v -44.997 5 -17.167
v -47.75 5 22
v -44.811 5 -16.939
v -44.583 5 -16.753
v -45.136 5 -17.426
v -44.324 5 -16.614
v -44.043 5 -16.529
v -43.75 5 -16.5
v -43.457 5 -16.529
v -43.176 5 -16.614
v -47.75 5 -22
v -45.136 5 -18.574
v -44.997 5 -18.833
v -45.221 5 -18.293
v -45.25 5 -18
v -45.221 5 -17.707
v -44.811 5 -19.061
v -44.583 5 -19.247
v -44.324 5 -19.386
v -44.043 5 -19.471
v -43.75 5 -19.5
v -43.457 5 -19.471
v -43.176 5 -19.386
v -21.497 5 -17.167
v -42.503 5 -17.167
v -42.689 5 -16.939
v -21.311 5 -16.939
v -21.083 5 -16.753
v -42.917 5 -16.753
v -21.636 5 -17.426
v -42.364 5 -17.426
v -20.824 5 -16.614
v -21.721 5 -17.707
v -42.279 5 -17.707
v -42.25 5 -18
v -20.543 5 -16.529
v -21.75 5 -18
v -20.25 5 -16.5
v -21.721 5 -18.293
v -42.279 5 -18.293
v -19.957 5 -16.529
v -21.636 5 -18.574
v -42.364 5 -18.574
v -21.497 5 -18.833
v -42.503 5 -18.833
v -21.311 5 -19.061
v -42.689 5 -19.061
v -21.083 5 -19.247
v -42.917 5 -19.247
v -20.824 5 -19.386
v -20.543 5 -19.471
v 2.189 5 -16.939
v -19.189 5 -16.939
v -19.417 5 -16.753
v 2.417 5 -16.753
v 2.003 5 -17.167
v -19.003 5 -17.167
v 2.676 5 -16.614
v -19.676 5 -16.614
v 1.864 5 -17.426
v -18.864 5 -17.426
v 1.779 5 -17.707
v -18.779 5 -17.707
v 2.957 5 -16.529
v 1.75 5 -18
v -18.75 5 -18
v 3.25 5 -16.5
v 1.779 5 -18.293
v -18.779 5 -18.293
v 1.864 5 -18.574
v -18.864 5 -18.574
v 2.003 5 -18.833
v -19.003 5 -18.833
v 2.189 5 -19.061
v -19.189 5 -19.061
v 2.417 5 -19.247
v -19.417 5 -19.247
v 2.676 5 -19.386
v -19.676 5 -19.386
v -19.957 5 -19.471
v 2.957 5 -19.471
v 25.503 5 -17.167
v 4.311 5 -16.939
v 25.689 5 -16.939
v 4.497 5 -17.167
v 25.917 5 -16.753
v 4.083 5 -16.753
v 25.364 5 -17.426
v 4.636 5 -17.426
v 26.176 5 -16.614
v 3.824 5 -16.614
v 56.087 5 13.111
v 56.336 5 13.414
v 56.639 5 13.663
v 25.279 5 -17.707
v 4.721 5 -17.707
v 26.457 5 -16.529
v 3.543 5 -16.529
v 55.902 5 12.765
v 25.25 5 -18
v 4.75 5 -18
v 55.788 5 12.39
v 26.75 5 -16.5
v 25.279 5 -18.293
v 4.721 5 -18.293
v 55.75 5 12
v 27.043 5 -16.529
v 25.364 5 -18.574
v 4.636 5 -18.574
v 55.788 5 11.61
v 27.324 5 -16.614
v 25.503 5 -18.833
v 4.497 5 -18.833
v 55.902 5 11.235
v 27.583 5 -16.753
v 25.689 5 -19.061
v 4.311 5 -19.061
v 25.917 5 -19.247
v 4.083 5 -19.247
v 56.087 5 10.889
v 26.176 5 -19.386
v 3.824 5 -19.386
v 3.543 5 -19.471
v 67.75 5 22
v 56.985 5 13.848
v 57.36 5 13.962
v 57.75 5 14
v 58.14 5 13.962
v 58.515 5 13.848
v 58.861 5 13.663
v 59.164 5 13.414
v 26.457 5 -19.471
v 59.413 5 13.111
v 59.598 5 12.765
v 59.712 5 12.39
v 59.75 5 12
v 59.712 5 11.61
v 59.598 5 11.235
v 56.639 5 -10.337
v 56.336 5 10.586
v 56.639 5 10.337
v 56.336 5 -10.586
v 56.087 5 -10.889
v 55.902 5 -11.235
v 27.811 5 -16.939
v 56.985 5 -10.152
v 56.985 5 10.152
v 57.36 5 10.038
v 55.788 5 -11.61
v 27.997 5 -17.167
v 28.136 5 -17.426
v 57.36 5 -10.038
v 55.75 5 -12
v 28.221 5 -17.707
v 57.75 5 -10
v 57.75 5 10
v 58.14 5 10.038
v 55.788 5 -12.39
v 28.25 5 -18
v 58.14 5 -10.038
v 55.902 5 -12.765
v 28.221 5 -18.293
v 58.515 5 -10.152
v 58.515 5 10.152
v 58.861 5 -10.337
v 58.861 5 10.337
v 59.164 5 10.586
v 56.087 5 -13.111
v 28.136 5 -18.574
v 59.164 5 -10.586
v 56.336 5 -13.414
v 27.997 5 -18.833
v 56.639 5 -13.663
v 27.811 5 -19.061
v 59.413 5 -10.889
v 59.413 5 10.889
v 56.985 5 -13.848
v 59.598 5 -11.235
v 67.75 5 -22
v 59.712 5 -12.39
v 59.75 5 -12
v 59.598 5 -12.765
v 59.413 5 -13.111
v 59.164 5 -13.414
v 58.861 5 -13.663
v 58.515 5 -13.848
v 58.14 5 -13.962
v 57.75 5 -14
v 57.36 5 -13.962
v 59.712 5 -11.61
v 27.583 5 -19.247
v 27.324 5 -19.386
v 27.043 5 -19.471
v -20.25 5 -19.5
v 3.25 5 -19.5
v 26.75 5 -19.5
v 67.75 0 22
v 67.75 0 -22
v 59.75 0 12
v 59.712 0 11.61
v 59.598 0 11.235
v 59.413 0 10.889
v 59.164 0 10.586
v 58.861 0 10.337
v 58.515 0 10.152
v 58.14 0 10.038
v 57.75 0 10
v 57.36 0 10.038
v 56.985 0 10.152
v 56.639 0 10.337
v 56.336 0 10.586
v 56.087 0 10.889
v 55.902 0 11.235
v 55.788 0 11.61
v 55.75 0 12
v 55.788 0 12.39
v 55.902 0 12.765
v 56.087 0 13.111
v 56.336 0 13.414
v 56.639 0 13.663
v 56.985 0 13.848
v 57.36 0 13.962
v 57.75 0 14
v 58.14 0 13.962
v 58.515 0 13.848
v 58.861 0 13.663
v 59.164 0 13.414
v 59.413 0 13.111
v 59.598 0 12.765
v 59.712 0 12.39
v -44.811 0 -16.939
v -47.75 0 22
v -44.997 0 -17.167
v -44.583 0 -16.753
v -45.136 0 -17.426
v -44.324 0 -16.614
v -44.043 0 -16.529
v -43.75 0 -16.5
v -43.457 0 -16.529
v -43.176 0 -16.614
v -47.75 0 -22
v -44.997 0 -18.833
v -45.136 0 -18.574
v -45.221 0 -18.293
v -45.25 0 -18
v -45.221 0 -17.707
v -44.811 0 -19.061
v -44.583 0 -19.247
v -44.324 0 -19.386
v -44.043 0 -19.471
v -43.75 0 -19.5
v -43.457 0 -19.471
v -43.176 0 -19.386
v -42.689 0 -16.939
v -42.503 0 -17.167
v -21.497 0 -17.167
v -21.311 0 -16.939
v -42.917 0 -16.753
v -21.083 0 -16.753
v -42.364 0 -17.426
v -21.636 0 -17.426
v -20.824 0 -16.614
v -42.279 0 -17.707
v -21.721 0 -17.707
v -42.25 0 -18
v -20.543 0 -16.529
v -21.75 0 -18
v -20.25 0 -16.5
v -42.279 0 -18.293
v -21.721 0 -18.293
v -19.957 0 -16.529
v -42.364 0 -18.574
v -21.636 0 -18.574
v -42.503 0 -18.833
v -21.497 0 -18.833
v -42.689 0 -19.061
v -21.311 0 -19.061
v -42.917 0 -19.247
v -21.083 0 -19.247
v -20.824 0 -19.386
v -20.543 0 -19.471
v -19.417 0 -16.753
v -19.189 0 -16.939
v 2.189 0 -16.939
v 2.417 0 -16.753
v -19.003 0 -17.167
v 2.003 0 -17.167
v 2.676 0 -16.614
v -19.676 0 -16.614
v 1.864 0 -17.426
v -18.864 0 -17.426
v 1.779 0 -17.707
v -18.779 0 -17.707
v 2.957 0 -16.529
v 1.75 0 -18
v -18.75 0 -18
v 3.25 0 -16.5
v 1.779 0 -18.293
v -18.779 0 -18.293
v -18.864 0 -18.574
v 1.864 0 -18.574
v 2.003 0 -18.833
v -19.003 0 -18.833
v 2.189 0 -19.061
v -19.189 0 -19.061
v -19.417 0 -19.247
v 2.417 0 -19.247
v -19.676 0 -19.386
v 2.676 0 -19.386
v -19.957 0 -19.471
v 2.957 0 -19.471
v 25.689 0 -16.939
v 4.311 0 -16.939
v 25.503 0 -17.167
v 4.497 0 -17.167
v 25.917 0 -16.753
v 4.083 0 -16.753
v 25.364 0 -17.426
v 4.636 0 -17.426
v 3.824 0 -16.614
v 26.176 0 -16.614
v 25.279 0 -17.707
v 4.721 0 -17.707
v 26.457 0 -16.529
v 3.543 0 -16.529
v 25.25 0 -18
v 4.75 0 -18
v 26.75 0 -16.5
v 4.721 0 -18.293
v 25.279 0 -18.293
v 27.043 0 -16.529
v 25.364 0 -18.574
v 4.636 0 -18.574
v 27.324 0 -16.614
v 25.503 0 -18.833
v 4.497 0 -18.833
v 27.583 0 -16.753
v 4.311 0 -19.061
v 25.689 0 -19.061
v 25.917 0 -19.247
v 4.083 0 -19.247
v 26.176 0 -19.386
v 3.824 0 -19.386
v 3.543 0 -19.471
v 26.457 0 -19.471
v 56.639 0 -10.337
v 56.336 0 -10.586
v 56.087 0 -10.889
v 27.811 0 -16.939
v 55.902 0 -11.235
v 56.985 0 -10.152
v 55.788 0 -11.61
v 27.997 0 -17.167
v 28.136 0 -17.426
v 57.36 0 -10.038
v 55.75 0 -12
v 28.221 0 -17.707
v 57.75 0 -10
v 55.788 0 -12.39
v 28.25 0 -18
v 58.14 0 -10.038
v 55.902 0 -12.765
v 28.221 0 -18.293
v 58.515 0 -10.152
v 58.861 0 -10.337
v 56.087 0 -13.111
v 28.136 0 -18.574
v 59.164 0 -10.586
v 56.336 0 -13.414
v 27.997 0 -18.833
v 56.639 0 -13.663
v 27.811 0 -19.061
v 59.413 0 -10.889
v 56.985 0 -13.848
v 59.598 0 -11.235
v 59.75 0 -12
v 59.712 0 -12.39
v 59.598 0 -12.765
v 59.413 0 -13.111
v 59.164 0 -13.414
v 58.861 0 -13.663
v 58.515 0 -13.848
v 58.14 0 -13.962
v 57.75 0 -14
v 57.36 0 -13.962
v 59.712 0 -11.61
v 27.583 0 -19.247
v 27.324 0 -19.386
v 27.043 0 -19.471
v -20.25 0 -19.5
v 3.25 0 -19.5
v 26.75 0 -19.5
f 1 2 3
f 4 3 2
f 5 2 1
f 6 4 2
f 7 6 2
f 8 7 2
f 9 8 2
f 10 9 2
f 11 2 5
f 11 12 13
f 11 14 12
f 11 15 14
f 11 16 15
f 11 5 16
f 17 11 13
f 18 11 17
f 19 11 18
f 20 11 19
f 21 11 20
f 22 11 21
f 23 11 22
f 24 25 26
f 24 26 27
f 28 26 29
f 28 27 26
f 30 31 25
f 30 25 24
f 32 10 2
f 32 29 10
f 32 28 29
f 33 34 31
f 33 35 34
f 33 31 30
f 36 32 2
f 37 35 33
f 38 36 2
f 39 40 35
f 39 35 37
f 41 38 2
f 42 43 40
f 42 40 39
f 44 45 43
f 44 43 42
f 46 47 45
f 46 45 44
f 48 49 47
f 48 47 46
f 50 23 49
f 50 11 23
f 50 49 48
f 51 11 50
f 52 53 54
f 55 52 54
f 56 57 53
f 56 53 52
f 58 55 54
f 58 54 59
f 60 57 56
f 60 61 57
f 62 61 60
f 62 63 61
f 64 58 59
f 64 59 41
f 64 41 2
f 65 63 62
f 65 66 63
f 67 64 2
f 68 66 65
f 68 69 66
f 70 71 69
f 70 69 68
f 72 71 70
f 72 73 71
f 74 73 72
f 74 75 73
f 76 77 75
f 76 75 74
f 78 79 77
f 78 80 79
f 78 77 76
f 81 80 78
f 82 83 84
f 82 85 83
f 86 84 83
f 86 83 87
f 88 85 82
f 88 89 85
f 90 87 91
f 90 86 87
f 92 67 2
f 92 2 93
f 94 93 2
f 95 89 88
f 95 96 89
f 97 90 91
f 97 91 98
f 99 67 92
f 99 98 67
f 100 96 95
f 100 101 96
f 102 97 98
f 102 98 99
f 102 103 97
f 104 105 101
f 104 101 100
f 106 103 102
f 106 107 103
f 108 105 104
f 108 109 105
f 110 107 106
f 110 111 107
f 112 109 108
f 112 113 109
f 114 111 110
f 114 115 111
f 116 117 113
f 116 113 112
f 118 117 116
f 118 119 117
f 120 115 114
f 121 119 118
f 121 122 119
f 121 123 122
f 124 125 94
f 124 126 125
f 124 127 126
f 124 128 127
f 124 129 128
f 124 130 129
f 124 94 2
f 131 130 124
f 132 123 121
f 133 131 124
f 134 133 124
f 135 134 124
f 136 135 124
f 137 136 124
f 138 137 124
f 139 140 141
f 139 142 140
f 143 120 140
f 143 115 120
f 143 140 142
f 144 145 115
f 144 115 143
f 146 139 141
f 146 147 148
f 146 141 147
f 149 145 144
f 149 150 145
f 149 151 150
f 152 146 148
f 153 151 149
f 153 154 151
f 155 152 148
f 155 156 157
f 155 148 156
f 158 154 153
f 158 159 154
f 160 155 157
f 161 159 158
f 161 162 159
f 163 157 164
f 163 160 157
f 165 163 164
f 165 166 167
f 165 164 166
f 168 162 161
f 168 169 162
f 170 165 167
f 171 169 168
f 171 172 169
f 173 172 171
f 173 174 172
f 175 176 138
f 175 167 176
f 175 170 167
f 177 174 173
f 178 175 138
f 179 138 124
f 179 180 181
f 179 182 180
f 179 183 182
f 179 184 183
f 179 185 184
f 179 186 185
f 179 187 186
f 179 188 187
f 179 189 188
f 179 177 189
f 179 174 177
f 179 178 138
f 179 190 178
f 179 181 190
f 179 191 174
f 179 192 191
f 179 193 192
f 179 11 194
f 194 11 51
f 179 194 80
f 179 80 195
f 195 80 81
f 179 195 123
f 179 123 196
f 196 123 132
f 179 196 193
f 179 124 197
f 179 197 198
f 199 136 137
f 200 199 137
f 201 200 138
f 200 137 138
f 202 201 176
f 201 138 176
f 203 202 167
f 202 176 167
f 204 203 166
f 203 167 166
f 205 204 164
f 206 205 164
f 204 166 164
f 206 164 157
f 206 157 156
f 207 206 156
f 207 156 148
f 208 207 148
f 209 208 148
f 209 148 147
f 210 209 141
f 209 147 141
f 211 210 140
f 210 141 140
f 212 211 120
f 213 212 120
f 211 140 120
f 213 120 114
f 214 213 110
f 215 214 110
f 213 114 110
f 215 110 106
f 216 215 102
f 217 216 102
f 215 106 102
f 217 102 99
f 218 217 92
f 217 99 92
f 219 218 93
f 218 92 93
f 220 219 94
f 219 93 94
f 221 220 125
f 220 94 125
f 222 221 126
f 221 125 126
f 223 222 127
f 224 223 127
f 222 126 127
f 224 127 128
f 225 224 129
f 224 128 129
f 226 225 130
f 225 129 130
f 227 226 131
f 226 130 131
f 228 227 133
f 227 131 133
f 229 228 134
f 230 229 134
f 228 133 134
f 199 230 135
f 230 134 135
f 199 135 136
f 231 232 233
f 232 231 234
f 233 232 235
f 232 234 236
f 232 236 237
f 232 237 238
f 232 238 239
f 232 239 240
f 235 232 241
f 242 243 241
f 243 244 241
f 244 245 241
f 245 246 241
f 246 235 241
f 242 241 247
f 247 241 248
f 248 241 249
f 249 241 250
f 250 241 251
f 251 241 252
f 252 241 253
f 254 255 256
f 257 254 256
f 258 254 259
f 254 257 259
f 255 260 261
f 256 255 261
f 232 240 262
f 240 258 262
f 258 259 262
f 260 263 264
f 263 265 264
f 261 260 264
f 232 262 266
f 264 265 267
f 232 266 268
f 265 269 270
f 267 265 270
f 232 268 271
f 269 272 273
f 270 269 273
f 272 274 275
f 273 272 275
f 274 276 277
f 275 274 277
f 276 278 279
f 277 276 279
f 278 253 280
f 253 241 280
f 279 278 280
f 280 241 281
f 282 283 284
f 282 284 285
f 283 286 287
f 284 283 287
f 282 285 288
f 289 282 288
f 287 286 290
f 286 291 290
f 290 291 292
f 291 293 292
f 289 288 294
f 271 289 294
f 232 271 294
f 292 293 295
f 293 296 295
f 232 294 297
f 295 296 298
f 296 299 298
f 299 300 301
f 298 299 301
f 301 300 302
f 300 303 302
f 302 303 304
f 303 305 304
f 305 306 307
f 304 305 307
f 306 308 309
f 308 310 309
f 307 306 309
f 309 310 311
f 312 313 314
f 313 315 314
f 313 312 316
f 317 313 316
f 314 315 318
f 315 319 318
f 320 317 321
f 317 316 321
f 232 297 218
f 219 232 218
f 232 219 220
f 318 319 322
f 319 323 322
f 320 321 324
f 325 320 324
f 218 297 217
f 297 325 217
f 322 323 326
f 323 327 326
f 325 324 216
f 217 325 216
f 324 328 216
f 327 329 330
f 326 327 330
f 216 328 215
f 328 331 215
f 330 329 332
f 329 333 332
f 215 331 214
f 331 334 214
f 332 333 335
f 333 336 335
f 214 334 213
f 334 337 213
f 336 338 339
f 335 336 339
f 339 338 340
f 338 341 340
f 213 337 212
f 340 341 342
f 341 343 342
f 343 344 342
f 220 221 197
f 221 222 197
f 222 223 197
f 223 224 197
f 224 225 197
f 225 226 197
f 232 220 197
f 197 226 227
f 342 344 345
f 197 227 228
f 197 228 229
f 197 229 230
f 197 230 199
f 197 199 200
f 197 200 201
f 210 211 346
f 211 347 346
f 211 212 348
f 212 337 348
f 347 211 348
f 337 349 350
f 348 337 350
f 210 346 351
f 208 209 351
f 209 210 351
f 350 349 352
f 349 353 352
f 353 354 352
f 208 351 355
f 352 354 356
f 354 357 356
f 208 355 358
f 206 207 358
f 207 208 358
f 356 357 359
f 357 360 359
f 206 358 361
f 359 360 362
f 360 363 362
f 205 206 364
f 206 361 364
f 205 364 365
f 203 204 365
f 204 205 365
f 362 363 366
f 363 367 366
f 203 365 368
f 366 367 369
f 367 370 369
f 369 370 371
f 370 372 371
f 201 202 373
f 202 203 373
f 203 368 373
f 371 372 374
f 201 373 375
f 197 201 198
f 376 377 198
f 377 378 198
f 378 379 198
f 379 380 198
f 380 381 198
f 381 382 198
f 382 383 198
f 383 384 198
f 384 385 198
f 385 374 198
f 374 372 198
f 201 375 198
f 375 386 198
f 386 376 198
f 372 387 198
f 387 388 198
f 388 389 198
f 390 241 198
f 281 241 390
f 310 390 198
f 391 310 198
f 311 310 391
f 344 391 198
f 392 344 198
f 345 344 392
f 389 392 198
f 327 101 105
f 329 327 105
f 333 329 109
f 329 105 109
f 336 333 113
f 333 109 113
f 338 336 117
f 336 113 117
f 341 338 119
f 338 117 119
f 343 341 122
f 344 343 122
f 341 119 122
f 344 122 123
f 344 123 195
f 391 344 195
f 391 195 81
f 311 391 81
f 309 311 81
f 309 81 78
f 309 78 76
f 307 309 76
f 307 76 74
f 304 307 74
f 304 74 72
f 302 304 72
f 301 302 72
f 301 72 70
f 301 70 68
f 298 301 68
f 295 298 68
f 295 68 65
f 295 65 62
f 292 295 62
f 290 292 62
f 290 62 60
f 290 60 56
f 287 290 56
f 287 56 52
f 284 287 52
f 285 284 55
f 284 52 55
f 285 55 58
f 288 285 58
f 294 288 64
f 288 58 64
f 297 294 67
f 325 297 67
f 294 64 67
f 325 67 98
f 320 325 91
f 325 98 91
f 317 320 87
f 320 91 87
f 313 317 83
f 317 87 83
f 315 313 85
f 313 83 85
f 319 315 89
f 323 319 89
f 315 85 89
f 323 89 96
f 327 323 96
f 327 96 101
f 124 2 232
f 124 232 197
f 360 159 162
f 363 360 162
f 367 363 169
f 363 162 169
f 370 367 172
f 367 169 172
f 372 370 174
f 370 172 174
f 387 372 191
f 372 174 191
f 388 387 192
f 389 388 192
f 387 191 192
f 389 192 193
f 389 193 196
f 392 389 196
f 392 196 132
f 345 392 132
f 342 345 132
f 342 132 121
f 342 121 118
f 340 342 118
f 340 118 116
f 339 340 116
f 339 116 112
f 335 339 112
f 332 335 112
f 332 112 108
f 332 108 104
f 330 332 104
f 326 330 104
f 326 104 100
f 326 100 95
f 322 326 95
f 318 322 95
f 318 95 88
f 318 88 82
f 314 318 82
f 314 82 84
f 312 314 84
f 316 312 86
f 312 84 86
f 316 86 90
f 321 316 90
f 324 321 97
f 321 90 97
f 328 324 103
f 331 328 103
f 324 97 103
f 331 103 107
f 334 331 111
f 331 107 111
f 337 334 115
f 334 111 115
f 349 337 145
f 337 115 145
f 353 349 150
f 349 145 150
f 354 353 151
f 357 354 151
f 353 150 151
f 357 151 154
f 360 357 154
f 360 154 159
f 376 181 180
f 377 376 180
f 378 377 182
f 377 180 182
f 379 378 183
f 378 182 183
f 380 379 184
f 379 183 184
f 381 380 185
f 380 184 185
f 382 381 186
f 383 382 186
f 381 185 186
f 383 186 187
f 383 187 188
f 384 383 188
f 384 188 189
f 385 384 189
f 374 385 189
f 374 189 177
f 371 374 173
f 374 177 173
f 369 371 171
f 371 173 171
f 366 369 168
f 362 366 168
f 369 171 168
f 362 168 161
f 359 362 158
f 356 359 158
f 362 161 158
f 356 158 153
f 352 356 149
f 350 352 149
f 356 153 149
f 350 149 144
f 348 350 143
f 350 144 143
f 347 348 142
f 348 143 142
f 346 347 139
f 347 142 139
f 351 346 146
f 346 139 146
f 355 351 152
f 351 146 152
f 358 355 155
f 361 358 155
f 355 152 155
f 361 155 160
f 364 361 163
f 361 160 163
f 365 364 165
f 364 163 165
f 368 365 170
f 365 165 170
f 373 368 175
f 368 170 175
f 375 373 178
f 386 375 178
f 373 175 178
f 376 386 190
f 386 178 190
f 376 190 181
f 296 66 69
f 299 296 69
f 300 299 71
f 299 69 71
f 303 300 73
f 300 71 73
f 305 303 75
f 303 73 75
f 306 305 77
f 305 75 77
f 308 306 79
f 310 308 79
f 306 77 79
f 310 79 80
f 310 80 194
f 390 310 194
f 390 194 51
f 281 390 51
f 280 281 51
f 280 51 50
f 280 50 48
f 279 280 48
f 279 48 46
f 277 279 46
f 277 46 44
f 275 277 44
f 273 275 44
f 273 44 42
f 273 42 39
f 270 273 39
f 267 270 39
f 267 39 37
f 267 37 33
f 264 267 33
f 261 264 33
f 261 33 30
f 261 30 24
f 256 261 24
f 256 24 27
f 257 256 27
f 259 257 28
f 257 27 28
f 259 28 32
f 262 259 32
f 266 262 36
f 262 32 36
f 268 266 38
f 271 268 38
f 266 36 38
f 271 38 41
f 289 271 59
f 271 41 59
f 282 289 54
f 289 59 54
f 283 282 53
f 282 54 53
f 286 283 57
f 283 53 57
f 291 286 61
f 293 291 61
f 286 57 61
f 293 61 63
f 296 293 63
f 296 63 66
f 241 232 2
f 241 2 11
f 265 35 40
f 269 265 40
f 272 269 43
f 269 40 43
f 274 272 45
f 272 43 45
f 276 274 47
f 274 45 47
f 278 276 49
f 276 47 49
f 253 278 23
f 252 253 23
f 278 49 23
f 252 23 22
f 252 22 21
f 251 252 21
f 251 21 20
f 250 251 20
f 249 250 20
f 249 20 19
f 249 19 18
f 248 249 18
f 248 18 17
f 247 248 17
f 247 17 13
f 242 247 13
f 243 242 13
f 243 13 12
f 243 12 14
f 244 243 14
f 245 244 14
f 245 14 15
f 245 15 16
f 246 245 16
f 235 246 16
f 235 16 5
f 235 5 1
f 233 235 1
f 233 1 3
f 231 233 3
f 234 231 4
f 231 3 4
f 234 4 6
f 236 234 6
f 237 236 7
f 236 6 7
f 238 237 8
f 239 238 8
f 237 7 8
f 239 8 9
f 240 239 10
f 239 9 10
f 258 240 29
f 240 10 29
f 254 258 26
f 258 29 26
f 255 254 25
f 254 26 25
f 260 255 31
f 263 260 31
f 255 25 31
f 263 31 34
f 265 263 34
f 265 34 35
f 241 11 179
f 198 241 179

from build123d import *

# Parameters (mm, degrees)
SKETCH1_W           = 95.5
SKETCH1_H           = 44
BOSS_EXTRUDE1_DEPTH = 5
SKETCH2_R           = 1.5
CUT_EXTRUDE1_DEPTH  = 6
SKETCH3_W           = 20
SKETCH3_H           = 44
SKETCH3_R           = 2
BOSS_EXTRUDE2_DEPTH = 5


with BuildPart() as part:
    # Sketch1 → Boss-Extrude1 (new body)
    with BuildSketch(Plane(origin=(0, 0, 0), x_dir=(1, 0, 0), z_dir=(0, 1, 0))):
        Rectangle(SKETCH1_W, SKETCH1_H)
    extrude(amount=BOSS_EXTRUDE1_DEPTH)

    # Sketch2 → Cut-Extrude1 (cut, through all)
    with BuildSketch(Plane(origin=(0, 5, 0), x_dir=(1, 0, 0), z_dir=(0, 1, 0))):
        with Locations((-43.75, 18)):
            Circle(SKETCH2_R)
        with Locations((-20.25, 18)):
            Circle(SKETCH2_R)
        with Locations((3.25, 18)):
            Circle(SKETCH2_R)
        with Locations((26.75, 18)):
            Circle(SKETCH2_R)
    extrude(amount=-CUT_EXTRUDE1_DEPTH, mode=Mode.SUBTRACT)

    # Sketch3 → Boss-Extrude2 (add)
    with BuildSketch(Plane(origin=(0, 5, 0), x_dir=(1, 0, 0), z_dir=(0, 1, 0))):
        with Locations((57.75, 0)):
            Rectangle(SKETCH3_W, SKETCH3_H)
        with Locations((57.75, 12)):
            Circle(SKETCH3_R, mode=Mode.SUBTRACT)
        with Locations((57.75, -12)):
            Circle(SKETCH3_R, mode=Mode.SUBTRACT)
    extrude(amount=-BOSS_EXTRUDE2_DEPTH)


solid = part.part
